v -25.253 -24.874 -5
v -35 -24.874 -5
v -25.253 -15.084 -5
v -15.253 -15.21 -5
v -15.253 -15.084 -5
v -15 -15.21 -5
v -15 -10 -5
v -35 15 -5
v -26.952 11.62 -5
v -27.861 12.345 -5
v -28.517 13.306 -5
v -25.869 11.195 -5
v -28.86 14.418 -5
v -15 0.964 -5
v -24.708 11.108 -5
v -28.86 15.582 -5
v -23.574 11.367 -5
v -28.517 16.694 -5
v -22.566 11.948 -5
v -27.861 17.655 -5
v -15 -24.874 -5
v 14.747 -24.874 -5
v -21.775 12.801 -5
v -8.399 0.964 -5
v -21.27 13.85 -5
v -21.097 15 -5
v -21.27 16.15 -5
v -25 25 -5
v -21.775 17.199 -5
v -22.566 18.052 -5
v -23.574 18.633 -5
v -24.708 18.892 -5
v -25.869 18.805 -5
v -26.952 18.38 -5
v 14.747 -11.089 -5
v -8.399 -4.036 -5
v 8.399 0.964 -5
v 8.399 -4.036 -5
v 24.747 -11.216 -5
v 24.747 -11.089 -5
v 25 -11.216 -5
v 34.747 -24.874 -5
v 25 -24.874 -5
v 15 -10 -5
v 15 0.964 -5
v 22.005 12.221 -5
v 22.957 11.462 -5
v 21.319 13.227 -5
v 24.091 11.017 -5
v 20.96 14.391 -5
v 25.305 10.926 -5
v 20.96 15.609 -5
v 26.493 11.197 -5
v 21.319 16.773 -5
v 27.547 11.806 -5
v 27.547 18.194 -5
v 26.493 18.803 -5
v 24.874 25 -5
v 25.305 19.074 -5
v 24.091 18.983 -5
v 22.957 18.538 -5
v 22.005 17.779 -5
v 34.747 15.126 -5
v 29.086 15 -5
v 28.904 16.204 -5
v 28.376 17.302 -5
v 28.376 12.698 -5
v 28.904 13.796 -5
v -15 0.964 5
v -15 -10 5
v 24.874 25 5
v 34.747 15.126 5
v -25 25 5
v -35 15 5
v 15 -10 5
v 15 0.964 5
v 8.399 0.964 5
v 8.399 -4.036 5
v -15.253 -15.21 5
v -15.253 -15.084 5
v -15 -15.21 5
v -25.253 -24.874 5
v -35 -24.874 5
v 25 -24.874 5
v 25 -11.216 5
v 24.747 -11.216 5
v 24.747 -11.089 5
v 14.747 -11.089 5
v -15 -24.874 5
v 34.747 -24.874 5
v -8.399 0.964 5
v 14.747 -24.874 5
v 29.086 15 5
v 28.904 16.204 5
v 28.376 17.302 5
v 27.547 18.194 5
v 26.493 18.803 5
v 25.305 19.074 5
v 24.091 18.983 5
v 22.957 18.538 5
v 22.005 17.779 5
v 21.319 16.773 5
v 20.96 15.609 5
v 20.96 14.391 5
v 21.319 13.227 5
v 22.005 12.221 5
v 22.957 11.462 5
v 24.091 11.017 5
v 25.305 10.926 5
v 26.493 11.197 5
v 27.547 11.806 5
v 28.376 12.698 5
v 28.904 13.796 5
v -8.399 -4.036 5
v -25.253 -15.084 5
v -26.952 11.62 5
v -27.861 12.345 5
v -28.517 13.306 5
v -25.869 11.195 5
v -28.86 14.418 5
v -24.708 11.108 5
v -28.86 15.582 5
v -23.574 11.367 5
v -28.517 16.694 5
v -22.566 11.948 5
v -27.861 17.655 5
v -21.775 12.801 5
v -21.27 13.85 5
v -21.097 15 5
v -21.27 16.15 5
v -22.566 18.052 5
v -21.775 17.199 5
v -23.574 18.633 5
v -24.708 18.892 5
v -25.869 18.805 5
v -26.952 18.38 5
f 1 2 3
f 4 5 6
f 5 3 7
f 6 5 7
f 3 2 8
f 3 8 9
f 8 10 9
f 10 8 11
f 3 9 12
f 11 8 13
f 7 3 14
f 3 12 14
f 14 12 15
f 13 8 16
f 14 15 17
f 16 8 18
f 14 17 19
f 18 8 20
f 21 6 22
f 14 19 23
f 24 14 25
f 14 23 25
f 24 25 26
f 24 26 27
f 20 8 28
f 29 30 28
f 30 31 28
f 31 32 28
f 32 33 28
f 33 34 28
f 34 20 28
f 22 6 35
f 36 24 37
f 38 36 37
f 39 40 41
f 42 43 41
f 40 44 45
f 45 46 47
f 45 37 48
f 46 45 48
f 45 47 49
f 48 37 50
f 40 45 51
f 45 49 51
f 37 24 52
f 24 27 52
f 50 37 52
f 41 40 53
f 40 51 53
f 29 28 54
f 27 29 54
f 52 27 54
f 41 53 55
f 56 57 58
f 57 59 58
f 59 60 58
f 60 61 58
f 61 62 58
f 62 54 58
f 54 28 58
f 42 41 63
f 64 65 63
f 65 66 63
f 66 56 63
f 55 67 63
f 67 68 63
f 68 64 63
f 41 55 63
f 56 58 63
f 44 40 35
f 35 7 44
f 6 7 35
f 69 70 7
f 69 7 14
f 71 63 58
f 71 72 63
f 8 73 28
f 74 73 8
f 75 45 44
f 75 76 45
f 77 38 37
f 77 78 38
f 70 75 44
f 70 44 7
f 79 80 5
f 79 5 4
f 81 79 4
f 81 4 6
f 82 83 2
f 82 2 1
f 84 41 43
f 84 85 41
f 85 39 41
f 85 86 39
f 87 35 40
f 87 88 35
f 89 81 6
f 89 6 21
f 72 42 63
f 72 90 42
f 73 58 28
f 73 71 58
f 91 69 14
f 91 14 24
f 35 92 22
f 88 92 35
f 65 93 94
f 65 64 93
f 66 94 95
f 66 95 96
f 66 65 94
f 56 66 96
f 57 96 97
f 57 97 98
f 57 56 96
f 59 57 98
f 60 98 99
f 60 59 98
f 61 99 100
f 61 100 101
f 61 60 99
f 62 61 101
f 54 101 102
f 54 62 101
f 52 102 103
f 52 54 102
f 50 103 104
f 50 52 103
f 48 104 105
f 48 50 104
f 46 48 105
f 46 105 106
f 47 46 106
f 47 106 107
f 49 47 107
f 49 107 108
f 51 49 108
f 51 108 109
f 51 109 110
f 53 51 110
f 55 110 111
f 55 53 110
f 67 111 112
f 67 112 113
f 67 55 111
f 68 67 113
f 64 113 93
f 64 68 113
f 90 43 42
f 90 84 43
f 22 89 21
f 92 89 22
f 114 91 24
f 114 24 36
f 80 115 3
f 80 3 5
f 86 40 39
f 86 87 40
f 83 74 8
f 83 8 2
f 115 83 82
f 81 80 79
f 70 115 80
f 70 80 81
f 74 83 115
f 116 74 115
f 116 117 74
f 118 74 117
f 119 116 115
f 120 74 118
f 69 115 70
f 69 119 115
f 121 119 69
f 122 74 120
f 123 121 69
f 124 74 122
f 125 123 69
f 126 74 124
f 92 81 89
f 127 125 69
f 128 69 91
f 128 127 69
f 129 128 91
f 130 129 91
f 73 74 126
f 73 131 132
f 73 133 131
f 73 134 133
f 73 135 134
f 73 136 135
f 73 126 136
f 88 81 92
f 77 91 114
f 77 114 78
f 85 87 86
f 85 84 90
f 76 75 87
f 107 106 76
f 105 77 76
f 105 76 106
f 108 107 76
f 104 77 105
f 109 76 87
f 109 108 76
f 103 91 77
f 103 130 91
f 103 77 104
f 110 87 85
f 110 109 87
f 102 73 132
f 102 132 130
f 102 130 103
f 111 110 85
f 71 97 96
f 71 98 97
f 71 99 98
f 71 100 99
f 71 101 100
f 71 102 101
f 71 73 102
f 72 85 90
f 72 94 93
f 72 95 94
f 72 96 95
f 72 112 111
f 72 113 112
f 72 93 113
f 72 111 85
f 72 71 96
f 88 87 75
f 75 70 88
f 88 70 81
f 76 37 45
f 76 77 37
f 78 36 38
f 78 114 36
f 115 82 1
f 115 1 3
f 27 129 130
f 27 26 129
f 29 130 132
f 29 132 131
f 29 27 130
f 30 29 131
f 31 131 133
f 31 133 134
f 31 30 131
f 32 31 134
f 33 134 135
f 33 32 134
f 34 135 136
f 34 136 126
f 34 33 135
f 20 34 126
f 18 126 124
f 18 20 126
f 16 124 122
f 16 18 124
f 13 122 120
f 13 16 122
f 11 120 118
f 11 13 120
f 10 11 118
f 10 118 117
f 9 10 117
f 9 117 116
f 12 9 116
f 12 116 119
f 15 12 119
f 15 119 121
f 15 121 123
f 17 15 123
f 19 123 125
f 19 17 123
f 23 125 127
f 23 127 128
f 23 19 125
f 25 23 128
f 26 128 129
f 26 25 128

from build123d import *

# Parameters (mm, degrees)
SKETCH1_R           = 3.903170007
SKETCH1_R_2         = 4.085841865
BOSS_EXTRUDE1_DEPTH = 5


with BuildPart() as part:
    # Sketch1 → Boss-Extrude1 (new, symmetric)
    with BuildSketch(Plane.XY):
        Polygon((24.873664066, 25), (-25, 25), (-35, 15), (-35, -24.873664066), (-25.252671867, -24.873664066), (-25.252671867, -15.08356524), (-15.252671867, -15.08356524), (-15.252671867, -15.209901174), (-15, -15.209901174), (-15, -24.873664066), (14.747328133, -24.873664066), (14.747328133, -11.089222254), (24.747328133, -11.089222254), (24.747328133, -11.215558187), (25, -11.215558187), (25, -24.873664066), (34.747328133, -24.873664066), (34.747328133, 15.126335934), align=None)
        Polygon((15, -10), (-15, -10), (-15, 0.964343272), (-8.398565663, 0.964343272), (-8.398565663, -4.035656728), (8.398565663, -4.035656728), (8.398565663, 0.964343272), (15, 0.964343272), align=None, mode=Mode.SUBTRACT)
        with Locations((-25, 15)):
            Circle(SKETCH1_R, mode=Mode.SUBTRACT)
        with Locations((25, 15)):
            Circle(SKETCH1_R_2, mode=Mode.SUBTRACT)
    extrude(amount=BOSS_EXTRUDE1_DEPTH, both=True)


solid = part.part
